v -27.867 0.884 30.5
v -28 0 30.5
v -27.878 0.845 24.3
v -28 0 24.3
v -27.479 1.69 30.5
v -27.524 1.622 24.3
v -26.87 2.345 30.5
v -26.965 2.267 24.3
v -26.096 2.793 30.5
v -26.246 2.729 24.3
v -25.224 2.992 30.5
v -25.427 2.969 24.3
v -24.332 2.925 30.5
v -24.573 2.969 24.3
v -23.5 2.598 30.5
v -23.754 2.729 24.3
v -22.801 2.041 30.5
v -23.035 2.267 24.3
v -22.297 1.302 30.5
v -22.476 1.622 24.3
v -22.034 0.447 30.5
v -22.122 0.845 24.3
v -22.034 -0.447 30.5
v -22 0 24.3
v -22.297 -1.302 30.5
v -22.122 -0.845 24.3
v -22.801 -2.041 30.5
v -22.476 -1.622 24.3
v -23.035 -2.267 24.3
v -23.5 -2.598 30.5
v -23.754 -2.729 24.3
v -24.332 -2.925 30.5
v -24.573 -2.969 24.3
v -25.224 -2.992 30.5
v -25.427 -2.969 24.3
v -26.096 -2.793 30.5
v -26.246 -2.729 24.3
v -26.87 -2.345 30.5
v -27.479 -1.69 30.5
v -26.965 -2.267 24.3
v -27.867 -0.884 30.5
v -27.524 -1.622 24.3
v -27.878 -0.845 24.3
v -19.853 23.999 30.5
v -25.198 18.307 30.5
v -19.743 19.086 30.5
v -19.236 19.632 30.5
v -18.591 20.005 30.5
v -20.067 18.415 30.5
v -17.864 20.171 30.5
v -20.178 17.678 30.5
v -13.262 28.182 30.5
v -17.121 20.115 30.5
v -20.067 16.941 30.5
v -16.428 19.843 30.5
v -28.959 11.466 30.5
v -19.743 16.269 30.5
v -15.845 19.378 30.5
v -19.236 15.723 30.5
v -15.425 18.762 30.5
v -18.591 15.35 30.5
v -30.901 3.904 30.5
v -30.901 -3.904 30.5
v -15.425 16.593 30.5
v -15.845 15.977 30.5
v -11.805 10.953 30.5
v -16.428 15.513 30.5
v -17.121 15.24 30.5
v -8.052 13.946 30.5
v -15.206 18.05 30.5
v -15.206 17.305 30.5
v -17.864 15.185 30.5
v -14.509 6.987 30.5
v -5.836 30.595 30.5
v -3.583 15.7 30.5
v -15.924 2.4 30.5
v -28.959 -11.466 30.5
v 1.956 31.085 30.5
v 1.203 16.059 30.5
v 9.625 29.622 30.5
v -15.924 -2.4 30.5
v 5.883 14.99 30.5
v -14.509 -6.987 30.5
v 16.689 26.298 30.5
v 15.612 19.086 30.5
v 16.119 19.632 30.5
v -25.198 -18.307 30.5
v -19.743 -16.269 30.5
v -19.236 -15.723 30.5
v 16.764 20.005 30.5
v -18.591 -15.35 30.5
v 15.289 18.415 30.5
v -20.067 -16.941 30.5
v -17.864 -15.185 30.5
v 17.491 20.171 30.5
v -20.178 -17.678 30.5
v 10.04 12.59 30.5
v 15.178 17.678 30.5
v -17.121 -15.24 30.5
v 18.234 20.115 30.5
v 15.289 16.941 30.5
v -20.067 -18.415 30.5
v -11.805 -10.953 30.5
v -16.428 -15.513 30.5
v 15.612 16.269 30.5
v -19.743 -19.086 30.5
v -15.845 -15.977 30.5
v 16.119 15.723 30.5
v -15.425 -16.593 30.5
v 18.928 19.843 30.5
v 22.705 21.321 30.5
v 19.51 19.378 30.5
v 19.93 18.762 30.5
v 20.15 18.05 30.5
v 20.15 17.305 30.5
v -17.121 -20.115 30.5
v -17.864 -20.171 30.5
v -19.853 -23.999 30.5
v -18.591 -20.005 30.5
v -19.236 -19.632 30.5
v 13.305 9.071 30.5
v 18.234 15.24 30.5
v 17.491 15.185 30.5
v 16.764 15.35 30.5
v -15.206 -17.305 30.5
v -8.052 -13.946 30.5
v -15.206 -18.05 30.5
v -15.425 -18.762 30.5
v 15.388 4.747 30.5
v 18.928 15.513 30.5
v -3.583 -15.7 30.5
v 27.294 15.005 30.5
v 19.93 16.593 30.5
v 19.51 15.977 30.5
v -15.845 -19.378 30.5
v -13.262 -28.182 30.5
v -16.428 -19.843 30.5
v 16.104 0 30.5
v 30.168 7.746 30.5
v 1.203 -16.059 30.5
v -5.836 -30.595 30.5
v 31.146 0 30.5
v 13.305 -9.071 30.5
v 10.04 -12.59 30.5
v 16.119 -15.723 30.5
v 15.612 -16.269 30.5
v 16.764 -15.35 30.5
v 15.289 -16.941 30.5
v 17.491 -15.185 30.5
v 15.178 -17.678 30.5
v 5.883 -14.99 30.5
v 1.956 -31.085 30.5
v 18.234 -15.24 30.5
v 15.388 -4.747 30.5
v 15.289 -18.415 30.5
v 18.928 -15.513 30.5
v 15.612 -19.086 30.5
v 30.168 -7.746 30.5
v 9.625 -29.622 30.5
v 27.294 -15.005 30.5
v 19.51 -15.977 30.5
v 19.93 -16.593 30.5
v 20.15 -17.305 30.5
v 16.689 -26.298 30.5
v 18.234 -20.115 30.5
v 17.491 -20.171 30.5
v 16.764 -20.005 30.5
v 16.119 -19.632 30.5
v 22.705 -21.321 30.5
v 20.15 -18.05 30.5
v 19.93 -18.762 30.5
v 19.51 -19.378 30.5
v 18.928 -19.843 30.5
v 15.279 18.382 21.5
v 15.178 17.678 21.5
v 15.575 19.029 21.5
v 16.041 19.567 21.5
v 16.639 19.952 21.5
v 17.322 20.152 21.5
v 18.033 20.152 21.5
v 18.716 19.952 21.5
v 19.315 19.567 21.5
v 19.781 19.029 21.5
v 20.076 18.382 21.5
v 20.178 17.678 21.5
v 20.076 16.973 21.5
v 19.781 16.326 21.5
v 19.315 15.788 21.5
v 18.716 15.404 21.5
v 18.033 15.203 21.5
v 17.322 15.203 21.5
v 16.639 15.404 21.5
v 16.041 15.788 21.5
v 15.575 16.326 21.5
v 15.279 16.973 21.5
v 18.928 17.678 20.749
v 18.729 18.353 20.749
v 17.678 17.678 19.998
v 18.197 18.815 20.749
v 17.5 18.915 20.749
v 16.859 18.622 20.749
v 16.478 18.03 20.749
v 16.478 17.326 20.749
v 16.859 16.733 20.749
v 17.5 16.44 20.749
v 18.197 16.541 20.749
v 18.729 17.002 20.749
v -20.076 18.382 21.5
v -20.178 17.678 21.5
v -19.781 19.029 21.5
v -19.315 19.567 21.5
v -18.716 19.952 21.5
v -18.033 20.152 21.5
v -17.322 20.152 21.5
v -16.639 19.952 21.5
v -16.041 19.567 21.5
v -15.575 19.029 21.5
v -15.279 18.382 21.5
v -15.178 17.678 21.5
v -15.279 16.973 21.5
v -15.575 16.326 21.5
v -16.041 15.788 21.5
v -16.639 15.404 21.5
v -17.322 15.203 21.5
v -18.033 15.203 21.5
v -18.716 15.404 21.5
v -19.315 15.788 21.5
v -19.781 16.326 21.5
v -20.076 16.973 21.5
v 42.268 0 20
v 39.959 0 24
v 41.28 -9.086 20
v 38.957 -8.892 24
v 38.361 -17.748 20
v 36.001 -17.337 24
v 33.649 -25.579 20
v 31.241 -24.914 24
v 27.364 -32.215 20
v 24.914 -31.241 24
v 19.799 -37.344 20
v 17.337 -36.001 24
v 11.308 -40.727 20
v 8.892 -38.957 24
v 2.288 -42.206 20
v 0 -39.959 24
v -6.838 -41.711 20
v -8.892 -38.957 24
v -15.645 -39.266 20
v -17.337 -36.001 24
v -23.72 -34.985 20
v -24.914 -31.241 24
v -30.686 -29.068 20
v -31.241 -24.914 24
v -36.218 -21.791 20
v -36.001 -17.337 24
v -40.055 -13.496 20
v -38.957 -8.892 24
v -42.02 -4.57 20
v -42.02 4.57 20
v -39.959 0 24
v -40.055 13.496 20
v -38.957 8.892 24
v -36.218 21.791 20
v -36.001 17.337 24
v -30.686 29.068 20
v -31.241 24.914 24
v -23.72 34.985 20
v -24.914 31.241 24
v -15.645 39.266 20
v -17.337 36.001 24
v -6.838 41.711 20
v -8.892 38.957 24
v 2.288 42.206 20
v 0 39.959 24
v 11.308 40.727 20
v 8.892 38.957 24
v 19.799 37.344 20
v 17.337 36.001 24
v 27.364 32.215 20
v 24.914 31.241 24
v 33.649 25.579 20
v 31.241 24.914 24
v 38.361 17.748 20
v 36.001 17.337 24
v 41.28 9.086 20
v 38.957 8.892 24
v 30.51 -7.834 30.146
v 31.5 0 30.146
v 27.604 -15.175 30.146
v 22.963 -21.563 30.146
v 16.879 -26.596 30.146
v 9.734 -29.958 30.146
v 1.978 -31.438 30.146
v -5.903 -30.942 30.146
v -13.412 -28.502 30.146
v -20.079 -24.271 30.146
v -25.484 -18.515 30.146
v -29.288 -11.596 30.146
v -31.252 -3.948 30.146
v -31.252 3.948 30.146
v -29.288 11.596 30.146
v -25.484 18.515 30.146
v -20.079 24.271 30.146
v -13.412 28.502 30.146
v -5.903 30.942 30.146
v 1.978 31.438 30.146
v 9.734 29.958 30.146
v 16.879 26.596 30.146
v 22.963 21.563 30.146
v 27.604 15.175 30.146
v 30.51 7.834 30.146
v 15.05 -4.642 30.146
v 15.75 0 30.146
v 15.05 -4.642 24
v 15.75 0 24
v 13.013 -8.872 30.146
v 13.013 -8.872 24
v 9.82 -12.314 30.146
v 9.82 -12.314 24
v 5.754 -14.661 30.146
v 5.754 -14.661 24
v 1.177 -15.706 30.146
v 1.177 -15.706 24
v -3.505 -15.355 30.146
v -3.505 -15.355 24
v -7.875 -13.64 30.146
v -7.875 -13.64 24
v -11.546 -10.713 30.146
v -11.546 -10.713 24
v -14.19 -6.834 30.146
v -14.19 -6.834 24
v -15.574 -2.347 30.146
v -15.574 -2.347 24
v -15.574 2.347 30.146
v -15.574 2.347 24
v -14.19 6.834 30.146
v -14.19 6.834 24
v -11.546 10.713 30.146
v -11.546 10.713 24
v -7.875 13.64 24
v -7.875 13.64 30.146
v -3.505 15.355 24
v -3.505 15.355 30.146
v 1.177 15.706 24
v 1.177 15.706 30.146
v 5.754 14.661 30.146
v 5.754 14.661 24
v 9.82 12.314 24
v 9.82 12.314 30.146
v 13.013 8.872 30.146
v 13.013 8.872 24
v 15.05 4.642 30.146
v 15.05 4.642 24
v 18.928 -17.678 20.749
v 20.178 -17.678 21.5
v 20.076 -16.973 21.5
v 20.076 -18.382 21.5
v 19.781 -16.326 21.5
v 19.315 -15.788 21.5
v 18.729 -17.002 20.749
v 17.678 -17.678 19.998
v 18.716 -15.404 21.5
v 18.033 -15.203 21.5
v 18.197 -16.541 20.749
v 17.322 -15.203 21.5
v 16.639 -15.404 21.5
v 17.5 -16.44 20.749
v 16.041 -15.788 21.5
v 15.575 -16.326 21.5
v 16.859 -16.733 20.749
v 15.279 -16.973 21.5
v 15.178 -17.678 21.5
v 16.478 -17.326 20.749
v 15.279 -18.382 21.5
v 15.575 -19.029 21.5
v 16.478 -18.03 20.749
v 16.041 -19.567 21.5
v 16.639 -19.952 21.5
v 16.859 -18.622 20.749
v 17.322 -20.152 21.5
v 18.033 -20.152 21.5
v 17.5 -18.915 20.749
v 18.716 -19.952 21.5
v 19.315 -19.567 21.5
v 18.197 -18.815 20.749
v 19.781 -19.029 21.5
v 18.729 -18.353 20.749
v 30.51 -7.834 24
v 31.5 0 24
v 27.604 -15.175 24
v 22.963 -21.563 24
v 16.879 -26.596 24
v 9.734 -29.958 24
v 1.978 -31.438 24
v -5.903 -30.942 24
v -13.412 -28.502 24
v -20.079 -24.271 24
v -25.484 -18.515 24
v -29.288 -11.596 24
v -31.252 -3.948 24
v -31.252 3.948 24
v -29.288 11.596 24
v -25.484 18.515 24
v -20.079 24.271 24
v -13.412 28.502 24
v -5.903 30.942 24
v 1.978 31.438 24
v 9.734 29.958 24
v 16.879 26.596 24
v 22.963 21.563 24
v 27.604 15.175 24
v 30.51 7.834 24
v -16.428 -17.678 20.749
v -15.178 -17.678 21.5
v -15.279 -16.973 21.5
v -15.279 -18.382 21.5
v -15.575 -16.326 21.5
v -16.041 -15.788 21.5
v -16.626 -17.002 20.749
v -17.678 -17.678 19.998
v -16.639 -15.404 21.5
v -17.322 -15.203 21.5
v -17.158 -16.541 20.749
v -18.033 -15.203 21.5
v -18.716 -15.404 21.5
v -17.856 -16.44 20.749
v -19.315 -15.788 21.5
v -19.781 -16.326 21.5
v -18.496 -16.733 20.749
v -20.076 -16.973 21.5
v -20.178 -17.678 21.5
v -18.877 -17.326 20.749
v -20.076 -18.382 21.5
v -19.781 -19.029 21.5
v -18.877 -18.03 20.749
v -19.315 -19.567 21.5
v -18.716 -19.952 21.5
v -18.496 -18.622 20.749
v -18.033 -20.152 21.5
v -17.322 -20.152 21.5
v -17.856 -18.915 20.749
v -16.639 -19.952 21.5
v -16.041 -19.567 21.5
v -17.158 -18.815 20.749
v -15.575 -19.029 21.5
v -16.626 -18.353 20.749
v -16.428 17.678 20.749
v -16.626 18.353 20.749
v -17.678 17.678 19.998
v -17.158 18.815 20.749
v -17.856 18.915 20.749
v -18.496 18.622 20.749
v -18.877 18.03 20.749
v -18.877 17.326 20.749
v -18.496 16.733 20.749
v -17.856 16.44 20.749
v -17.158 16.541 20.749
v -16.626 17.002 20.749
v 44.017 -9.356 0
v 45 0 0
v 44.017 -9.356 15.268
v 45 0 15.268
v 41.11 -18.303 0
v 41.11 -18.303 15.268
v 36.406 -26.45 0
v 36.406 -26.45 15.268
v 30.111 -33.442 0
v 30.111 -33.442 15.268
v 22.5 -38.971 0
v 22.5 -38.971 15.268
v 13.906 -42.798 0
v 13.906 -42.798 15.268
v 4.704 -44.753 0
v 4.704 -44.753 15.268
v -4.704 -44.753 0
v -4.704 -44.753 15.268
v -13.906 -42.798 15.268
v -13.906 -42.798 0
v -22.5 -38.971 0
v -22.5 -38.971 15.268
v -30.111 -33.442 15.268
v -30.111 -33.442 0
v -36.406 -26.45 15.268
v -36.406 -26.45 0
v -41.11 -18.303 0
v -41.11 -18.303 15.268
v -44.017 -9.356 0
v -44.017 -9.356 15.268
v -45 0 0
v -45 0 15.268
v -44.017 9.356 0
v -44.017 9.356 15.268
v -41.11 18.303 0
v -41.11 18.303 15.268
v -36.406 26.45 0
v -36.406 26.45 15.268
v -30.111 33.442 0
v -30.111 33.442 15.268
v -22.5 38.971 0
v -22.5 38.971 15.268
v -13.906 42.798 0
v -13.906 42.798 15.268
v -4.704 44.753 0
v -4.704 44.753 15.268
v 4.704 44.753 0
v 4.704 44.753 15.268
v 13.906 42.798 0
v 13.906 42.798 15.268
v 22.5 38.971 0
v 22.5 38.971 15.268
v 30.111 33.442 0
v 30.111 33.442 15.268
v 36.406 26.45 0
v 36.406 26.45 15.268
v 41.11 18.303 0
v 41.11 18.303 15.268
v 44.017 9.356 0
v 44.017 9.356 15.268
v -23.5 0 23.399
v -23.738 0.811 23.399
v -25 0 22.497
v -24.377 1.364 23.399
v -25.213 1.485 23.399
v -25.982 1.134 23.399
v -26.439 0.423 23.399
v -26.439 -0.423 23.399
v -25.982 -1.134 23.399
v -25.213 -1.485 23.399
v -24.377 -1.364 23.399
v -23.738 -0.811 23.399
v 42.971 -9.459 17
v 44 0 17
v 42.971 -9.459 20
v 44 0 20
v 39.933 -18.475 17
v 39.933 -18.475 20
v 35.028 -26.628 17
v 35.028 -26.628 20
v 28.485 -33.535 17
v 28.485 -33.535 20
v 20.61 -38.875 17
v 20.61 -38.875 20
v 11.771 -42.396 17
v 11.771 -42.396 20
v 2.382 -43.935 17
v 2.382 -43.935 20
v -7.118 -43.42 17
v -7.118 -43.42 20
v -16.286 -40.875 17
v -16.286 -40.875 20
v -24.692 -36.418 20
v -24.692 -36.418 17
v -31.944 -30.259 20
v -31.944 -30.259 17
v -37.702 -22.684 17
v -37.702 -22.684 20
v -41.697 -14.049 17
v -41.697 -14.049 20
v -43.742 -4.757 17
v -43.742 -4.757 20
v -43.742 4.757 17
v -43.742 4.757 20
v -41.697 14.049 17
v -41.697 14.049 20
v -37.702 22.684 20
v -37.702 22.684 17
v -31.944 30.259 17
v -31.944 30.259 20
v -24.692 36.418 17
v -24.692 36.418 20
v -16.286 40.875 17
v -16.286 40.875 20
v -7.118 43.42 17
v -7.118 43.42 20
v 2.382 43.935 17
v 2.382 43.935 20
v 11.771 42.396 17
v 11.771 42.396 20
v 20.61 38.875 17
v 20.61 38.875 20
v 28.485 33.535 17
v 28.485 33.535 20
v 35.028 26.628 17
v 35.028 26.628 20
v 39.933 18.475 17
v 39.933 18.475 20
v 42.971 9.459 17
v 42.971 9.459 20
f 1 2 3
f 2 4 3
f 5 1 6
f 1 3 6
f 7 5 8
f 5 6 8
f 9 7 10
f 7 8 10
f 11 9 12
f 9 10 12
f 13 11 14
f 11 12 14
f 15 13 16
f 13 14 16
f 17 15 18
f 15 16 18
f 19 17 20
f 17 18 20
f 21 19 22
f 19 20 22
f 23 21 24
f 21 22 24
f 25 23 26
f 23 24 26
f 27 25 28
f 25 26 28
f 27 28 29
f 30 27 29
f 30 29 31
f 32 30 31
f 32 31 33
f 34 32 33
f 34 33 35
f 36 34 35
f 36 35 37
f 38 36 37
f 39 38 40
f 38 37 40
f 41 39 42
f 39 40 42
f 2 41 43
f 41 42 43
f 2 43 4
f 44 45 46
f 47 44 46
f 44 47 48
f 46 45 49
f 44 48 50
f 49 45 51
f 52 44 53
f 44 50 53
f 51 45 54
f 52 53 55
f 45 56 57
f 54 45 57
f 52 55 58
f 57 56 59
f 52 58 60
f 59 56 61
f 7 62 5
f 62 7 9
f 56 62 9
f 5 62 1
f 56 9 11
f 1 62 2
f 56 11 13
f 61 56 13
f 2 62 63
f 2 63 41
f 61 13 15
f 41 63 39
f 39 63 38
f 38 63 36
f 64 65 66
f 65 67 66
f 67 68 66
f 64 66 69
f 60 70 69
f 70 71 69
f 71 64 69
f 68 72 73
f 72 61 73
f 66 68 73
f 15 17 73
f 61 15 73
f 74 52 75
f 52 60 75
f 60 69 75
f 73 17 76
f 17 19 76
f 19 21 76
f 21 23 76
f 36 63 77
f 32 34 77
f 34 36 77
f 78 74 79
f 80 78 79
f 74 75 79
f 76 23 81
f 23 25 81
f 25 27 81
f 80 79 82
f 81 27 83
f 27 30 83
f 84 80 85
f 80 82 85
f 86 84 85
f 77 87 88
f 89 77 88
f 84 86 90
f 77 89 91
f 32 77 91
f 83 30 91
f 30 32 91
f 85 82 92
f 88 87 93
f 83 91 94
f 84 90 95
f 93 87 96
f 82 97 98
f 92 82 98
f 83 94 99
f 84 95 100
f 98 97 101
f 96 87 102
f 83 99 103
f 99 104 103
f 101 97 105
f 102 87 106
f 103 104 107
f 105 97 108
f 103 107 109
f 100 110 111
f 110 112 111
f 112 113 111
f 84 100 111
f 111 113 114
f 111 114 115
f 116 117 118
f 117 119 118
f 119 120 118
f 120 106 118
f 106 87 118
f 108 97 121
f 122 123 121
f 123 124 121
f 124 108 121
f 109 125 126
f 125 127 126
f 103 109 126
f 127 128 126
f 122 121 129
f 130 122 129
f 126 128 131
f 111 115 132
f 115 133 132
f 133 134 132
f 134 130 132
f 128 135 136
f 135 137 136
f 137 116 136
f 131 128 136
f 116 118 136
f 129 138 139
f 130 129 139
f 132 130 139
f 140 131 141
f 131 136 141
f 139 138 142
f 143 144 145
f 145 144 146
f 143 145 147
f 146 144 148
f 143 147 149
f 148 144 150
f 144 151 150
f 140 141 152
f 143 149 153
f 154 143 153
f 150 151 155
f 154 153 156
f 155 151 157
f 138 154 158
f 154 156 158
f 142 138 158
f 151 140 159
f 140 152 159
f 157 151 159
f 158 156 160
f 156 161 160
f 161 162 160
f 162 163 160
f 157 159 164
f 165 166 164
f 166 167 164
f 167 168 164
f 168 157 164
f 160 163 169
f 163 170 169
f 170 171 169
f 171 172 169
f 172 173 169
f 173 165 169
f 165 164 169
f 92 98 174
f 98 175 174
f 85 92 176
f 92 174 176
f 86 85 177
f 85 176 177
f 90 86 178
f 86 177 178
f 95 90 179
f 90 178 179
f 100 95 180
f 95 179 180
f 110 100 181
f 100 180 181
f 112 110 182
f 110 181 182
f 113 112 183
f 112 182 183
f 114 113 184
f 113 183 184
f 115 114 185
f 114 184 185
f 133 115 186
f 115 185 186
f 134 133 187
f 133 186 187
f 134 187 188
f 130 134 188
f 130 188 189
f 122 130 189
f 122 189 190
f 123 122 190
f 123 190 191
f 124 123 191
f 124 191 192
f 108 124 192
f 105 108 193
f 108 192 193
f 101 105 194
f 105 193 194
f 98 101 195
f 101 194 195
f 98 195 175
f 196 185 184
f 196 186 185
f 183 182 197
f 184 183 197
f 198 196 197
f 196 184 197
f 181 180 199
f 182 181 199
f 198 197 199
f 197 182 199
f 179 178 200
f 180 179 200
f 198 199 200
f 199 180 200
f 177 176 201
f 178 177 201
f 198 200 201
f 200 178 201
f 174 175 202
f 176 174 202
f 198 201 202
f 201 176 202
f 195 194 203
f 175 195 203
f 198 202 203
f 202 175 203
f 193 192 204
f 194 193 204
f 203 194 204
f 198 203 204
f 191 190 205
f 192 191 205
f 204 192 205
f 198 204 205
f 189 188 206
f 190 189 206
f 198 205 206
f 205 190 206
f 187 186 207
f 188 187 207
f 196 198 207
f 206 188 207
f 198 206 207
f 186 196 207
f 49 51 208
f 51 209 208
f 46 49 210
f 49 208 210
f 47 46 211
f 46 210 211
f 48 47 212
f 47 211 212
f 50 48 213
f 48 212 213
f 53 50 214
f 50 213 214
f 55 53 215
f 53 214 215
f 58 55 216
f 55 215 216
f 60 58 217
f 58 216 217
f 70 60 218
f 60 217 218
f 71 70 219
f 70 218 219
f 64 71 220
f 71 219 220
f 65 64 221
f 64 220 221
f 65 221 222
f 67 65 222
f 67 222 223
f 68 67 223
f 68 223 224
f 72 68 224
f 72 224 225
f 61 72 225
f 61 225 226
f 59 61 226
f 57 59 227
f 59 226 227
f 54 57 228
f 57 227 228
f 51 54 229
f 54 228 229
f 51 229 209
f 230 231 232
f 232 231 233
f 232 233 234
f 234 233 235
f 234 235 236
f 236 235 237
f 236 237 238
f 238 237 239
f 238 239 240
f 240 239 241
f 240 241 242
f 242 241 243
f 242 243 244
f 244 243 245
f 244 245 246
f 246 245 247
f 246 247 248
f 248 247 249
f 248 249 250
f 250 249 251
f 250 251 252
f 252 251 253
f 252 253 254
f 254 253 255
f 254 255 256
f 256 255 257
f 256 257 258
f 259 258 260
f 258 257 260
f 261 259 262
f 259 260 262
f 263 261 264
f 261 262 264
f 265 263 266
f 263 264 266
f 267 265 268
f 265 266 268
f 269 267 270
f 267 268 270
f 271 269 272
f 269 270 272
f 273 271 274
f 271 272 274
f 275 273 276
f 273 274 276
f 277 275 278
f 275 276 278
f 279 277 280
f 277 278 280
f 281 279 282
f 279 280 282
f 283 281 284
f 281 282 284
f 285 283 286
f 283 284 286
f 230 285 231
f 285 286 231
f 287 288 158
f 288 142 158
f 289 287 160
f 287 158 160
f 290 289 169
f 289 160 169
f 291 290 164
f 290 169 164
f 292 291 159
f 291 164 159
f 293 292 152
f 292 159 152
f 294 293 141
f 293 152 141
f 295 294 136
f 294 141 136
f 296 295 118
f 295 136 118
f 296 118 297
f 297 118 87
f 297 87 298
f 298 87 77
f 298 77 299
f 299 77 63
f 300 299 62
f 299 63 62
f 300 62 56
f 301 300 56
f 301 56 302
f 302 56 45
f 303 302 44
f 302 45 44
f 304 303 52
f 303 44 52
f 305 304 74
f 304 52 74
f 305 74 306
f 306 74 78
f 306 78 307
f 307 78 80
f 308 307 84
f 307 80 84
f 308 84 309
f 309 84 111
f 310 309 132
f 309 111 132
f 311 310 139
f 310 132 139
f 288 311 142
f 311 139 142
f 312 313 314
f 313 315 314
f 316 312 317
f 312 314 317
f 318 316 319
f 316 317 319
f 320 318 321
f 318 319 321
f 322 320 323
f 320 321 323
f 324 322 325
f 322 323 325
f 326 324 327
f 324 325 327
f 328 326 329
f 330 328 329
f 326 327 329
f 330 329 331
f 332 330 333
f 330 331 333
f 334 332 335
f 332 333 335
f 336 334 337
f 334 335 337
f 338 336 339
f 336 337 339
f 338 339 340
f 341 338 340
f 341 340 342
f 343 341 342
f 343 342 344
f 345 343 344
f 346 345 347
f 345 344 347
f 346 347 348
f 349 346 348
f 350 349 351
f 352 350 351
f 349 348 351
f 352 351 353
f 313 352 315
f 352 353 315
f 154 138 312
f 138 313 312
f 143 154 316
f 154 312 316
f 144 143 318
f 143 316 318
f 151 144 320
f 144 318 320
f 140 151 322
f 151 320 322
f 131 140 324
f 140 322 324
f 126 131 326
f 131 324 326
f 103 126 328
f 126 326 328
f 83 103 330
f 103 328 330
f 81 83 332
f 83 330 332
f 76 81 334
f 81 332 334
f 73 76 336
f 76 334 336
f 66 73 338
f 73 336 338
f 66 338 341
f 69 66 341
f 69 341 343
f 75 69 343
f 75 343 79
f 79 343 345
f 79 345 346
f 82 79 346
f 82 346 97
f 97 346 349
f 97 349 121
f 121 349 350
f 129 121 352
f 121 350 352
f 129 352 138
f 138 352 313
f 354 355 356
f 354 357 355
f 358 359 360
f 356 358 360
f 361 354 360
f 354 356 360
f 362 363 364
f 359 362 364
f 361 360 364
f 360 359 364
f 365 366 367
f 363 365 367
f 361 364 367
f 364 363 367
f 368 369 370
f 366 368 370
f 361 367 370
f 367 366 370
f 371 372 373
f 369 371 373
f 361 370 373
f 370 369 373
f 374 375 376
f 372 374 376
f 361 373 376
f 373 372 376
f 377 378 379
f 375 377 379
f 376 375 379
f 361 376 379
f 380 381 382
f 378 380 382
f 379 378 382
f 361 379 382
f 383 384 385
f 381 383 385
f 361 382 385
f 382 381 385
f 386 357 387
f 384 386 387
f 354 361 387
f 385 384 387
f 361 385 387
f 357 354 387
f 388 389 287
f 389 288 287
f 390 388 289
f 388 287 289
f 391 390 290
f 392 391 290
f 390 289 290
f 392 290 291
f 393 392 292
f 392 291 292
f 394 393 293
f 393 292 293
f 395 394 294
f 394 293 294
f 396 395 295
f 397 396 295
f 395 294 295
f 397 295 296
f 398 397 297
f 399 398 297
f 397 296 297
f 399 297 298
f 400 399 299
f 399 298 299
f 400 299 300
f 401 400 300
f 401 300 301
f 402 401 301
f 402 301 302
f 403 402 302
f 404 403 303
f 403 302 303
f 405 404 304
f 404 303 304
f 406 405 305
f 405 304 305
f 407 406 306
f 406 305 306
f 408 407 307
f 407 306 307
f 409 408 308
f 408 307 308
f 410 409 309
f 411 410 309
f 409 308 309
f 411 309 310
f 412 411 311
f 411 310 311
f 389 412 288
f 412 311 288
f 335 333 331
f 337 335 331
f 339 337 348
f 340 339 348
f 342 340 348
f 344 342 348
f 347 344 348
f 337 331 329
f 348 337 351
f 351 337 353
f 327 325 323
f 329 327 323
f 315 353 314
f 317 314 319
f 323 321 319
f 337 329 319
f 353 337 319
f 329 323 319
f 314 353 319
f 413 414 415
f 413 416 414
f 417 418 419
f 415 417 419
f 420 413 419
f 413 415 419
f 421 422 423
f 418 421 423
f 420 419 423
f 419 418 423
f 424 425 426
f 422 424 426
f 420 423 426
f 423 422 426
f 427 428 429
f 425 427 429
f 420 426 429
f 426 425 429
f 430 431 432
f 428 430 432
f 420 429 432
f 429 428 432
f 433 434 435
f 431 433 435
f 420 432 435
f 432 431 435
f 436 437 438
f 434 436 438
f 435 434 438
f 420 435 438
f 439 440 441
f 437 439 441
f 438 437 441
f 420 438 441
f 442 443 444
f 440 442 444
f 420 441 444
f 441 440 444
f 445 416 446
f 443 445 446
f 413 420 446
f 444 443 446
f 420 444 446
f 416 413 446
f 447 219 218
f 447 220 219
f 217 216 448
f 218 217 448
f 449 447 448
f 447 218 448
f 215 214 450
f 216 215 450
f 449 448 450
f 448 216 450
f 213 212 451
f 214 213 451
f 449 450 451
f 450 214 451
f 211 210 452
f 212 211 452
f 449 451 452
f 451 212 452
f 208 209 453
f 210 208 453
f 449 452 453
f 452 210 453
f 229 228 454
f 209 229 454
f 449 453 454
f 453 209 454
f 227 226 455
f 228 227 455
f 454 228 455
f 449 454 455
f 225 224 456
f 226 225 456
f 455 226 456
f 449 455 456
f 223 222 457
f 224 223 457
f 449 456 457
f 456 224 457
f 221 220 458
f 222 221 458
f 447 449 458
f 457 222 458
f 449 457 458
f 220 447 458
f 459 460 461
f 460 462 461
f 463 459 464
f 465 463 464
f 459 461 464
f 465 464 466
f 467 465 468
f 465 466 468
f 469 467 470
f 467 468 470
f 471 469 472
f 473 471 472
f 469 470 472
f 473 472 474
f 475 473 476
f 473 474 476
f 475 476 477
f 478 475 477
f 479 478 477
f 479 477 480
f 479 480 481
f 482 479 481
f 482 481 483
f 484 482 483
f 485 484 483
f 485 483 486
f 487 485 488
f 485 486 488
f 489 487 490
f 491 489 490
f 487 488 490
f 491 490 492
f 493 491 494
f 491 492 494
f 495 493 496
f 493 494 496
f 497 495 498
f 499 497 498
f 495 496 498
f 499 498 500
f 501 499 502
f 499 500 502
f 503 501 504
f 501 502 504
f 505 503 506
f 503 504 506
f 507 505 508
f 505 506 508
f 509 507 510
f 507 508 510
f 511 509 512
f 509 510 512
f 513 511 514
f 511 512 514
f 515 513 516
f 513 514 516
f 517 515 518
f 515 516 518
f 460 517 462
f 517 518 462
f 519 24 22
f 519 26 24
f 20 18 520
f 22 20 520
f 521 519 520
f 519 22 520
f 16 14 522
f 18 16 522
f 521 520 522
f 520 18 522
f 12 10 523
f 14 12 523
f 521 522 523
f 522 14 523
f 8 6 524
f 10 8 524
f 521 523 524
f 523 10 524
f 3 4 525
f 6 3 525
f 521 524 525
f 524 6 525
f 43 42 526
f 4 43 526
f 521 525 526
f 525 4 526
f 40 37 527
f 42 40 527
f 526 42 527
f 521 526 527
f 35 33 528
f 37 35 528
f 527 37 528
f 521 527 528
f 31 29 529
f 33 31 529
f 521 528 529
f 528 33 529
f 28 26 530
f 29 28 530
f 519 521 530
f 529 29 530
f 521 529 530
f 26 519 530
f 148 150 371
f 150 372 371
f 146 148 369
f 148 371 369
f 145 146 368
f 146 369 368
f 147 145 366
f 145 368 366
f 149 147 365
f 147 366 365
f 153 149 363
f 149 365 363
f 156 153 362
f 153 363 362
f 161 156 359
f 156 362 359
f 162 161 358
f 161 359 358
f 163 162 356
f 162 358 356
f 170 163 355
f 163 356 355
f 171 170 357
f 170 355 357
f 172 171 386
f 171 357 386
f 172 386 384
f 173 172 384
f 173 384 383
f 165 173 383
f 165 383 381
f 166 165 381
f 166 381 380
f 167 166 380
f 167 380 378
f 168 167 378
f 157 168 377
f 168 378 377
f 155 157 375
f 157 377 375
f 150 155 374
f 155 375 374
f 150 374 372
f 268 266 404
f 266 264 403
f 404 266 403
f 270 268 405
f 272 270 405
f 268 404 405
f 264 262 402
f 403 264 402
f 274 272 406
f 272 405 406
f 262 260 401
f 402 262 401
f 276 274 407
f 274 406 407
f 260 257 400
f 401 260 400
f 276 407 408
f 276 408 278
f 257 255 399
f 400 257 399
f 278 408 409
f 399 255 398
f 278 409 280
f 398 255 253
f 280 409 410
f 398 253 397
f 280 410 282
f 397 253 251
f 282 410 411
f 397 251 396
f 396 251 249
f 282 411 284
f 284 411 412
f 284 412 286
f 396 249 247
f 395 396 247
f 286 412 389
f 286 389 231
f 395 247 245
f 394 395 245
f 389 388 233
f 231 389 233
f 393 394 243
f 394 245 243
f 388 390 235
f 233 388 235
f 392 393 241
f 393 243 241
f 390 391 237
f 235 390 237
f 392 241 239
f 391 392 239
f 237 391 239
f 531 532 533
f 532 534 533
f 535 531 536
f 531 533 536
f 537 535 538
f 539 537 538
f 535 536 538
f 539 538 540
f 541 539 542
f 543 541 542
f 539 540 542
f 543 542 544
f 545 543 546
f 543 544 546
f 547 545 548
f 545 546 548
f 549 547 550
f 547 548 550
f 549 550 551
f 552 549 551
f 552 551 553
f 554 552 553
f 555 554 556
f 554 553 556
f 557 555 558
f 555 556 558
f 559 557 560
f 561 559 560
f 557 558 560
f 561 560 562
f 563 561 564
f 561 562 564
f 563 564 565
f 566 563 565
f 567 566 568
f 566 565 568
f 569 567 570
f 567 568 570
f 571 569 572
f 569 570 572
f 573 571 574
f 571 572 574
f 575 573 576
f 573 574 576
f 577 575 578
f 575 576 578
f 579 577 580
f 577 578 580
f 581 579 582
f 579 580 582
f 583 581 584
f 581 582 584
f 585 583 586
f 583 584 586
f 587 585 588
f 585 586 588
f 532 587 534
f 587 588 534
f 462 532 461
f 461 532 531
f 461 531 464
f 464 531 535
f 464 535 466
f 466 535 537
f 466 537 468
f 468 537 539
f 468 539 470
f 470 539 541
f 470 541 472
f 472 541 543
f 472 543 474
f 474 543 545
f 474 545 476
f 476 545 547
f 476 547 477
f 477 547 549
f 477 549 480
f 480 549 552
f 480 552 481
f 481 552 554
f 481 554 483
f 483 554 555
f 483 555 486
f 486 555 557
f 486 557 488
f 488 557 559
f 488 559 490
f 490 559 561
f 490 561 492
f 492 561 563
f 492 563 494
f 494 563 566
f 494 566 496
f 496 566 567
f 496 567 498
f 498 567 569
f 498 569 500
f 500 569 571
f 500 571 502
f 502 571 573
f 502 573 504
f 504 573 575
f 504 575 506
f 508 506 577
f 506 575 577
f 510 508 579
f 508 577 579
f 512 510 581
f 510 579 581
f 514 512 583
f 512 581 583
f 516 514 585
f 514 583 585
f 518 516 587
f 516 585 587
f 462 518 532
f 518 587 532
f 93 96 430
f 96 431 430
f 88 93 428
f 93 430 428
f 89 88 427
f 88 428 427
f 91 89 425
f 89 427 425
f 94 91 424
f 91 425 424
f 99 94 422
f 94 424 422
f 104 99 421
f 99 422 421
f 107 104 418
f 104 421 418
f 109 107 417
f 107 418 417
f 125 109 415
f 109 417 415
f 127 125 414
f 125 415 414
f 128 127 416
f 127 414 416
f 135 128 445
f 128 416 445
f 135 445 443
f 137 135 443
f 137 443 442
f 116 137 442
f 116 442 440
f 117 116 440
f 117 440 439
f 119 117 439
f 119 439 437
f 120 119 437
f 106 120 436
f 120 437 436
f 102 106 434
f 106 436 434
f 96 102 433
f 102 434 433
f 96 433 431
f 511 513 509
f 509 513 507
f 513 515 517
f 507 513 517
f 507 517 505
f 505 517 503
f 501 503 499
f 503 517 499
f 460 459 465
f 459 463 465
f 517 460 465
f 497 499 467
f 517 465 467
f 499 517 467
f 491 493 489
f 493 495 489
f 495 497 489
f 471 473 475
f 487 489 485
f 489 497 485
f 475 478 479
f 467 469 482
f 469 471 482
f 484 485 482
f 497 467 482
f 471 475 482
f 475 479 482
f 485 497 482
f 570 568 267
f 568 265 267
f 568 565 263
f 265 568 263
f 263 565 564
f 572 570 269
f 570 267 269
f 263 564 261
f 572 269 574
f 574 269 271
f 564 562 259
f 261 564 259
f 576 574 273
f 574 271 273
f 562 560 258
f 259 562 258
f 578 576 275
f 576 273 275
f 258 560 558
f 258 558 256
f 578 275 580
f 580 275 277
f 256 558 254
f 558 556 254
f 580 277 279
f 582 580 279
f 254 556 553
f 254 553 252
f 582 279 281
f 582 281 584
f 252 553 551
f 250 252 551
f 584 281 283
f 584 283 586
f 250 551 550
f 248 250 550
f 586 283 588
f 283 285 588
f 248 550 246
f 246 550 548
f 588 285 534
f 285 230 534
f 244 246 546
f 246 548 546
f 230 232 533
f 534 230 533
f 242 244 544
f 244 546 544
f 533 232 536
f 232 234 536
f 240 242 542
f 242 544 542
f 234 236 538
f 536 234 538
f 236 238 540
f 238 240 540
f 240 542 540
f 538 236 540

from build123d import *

# Parameters (mm, degrees)
F3_D     = 5
F3_DEPTH = 9
F3_TIP   = 1.5021515476
F4_D     = 6
F4_DEPTH = 6.2
F4_TIP   = 1.8025818571


with BuildPart() as f1:
    # F0 (on Front) → F1 (revolve)
    with BuildSketch(Plane.XZ):
        Polygon((0, 24), (0, 0), (45, 0), (45, 15.2679491924), (44, 17), (44, 20), (42.2679491924, 20), (39.9585481157, 24), (31.5, 24), (31.5, 30.1464466094), (31.1464466094, 30.5), (16.1035533906, 30.5), (15.75, 30.1464466094), (15.75, 24), align=None)
    revolve(axis=Axis((0, 0, 12), (0, 0, -1)))

    # F3
    with Locations(Plane.XY.offset(30.5)):
        with Locations((-17.6776695297, 17.6776695297), (-17.6776695297, -17.6776695297), (17.6776695297, 17.6776695297), (17.6776695297, -17.6776695297)):
            Hole(F3_D / 2, depth=F3_DEPTH)
            with Locations((0, 0, -(F3_DEPTH + F3_TIP / 2))):  # 118° drill point
                Cone(0, F3_D / 2, F3_TIP, mode=Mode.SUBTRACT)

    # F4
    with Locations(Plane.XY.offset(30.5)):
        with Locations((-25, 0)):
            Hole(F4_D / 2, depth=F4_DEPTH)
            with Locations((0, 0, -(F4_DEPTH + F4_TIP / 2))):  # 118° drill point
                Cone(0, F4_D / 2, F4_TIP, mode=Mode.SUBTRACT)


solid = f1.part
